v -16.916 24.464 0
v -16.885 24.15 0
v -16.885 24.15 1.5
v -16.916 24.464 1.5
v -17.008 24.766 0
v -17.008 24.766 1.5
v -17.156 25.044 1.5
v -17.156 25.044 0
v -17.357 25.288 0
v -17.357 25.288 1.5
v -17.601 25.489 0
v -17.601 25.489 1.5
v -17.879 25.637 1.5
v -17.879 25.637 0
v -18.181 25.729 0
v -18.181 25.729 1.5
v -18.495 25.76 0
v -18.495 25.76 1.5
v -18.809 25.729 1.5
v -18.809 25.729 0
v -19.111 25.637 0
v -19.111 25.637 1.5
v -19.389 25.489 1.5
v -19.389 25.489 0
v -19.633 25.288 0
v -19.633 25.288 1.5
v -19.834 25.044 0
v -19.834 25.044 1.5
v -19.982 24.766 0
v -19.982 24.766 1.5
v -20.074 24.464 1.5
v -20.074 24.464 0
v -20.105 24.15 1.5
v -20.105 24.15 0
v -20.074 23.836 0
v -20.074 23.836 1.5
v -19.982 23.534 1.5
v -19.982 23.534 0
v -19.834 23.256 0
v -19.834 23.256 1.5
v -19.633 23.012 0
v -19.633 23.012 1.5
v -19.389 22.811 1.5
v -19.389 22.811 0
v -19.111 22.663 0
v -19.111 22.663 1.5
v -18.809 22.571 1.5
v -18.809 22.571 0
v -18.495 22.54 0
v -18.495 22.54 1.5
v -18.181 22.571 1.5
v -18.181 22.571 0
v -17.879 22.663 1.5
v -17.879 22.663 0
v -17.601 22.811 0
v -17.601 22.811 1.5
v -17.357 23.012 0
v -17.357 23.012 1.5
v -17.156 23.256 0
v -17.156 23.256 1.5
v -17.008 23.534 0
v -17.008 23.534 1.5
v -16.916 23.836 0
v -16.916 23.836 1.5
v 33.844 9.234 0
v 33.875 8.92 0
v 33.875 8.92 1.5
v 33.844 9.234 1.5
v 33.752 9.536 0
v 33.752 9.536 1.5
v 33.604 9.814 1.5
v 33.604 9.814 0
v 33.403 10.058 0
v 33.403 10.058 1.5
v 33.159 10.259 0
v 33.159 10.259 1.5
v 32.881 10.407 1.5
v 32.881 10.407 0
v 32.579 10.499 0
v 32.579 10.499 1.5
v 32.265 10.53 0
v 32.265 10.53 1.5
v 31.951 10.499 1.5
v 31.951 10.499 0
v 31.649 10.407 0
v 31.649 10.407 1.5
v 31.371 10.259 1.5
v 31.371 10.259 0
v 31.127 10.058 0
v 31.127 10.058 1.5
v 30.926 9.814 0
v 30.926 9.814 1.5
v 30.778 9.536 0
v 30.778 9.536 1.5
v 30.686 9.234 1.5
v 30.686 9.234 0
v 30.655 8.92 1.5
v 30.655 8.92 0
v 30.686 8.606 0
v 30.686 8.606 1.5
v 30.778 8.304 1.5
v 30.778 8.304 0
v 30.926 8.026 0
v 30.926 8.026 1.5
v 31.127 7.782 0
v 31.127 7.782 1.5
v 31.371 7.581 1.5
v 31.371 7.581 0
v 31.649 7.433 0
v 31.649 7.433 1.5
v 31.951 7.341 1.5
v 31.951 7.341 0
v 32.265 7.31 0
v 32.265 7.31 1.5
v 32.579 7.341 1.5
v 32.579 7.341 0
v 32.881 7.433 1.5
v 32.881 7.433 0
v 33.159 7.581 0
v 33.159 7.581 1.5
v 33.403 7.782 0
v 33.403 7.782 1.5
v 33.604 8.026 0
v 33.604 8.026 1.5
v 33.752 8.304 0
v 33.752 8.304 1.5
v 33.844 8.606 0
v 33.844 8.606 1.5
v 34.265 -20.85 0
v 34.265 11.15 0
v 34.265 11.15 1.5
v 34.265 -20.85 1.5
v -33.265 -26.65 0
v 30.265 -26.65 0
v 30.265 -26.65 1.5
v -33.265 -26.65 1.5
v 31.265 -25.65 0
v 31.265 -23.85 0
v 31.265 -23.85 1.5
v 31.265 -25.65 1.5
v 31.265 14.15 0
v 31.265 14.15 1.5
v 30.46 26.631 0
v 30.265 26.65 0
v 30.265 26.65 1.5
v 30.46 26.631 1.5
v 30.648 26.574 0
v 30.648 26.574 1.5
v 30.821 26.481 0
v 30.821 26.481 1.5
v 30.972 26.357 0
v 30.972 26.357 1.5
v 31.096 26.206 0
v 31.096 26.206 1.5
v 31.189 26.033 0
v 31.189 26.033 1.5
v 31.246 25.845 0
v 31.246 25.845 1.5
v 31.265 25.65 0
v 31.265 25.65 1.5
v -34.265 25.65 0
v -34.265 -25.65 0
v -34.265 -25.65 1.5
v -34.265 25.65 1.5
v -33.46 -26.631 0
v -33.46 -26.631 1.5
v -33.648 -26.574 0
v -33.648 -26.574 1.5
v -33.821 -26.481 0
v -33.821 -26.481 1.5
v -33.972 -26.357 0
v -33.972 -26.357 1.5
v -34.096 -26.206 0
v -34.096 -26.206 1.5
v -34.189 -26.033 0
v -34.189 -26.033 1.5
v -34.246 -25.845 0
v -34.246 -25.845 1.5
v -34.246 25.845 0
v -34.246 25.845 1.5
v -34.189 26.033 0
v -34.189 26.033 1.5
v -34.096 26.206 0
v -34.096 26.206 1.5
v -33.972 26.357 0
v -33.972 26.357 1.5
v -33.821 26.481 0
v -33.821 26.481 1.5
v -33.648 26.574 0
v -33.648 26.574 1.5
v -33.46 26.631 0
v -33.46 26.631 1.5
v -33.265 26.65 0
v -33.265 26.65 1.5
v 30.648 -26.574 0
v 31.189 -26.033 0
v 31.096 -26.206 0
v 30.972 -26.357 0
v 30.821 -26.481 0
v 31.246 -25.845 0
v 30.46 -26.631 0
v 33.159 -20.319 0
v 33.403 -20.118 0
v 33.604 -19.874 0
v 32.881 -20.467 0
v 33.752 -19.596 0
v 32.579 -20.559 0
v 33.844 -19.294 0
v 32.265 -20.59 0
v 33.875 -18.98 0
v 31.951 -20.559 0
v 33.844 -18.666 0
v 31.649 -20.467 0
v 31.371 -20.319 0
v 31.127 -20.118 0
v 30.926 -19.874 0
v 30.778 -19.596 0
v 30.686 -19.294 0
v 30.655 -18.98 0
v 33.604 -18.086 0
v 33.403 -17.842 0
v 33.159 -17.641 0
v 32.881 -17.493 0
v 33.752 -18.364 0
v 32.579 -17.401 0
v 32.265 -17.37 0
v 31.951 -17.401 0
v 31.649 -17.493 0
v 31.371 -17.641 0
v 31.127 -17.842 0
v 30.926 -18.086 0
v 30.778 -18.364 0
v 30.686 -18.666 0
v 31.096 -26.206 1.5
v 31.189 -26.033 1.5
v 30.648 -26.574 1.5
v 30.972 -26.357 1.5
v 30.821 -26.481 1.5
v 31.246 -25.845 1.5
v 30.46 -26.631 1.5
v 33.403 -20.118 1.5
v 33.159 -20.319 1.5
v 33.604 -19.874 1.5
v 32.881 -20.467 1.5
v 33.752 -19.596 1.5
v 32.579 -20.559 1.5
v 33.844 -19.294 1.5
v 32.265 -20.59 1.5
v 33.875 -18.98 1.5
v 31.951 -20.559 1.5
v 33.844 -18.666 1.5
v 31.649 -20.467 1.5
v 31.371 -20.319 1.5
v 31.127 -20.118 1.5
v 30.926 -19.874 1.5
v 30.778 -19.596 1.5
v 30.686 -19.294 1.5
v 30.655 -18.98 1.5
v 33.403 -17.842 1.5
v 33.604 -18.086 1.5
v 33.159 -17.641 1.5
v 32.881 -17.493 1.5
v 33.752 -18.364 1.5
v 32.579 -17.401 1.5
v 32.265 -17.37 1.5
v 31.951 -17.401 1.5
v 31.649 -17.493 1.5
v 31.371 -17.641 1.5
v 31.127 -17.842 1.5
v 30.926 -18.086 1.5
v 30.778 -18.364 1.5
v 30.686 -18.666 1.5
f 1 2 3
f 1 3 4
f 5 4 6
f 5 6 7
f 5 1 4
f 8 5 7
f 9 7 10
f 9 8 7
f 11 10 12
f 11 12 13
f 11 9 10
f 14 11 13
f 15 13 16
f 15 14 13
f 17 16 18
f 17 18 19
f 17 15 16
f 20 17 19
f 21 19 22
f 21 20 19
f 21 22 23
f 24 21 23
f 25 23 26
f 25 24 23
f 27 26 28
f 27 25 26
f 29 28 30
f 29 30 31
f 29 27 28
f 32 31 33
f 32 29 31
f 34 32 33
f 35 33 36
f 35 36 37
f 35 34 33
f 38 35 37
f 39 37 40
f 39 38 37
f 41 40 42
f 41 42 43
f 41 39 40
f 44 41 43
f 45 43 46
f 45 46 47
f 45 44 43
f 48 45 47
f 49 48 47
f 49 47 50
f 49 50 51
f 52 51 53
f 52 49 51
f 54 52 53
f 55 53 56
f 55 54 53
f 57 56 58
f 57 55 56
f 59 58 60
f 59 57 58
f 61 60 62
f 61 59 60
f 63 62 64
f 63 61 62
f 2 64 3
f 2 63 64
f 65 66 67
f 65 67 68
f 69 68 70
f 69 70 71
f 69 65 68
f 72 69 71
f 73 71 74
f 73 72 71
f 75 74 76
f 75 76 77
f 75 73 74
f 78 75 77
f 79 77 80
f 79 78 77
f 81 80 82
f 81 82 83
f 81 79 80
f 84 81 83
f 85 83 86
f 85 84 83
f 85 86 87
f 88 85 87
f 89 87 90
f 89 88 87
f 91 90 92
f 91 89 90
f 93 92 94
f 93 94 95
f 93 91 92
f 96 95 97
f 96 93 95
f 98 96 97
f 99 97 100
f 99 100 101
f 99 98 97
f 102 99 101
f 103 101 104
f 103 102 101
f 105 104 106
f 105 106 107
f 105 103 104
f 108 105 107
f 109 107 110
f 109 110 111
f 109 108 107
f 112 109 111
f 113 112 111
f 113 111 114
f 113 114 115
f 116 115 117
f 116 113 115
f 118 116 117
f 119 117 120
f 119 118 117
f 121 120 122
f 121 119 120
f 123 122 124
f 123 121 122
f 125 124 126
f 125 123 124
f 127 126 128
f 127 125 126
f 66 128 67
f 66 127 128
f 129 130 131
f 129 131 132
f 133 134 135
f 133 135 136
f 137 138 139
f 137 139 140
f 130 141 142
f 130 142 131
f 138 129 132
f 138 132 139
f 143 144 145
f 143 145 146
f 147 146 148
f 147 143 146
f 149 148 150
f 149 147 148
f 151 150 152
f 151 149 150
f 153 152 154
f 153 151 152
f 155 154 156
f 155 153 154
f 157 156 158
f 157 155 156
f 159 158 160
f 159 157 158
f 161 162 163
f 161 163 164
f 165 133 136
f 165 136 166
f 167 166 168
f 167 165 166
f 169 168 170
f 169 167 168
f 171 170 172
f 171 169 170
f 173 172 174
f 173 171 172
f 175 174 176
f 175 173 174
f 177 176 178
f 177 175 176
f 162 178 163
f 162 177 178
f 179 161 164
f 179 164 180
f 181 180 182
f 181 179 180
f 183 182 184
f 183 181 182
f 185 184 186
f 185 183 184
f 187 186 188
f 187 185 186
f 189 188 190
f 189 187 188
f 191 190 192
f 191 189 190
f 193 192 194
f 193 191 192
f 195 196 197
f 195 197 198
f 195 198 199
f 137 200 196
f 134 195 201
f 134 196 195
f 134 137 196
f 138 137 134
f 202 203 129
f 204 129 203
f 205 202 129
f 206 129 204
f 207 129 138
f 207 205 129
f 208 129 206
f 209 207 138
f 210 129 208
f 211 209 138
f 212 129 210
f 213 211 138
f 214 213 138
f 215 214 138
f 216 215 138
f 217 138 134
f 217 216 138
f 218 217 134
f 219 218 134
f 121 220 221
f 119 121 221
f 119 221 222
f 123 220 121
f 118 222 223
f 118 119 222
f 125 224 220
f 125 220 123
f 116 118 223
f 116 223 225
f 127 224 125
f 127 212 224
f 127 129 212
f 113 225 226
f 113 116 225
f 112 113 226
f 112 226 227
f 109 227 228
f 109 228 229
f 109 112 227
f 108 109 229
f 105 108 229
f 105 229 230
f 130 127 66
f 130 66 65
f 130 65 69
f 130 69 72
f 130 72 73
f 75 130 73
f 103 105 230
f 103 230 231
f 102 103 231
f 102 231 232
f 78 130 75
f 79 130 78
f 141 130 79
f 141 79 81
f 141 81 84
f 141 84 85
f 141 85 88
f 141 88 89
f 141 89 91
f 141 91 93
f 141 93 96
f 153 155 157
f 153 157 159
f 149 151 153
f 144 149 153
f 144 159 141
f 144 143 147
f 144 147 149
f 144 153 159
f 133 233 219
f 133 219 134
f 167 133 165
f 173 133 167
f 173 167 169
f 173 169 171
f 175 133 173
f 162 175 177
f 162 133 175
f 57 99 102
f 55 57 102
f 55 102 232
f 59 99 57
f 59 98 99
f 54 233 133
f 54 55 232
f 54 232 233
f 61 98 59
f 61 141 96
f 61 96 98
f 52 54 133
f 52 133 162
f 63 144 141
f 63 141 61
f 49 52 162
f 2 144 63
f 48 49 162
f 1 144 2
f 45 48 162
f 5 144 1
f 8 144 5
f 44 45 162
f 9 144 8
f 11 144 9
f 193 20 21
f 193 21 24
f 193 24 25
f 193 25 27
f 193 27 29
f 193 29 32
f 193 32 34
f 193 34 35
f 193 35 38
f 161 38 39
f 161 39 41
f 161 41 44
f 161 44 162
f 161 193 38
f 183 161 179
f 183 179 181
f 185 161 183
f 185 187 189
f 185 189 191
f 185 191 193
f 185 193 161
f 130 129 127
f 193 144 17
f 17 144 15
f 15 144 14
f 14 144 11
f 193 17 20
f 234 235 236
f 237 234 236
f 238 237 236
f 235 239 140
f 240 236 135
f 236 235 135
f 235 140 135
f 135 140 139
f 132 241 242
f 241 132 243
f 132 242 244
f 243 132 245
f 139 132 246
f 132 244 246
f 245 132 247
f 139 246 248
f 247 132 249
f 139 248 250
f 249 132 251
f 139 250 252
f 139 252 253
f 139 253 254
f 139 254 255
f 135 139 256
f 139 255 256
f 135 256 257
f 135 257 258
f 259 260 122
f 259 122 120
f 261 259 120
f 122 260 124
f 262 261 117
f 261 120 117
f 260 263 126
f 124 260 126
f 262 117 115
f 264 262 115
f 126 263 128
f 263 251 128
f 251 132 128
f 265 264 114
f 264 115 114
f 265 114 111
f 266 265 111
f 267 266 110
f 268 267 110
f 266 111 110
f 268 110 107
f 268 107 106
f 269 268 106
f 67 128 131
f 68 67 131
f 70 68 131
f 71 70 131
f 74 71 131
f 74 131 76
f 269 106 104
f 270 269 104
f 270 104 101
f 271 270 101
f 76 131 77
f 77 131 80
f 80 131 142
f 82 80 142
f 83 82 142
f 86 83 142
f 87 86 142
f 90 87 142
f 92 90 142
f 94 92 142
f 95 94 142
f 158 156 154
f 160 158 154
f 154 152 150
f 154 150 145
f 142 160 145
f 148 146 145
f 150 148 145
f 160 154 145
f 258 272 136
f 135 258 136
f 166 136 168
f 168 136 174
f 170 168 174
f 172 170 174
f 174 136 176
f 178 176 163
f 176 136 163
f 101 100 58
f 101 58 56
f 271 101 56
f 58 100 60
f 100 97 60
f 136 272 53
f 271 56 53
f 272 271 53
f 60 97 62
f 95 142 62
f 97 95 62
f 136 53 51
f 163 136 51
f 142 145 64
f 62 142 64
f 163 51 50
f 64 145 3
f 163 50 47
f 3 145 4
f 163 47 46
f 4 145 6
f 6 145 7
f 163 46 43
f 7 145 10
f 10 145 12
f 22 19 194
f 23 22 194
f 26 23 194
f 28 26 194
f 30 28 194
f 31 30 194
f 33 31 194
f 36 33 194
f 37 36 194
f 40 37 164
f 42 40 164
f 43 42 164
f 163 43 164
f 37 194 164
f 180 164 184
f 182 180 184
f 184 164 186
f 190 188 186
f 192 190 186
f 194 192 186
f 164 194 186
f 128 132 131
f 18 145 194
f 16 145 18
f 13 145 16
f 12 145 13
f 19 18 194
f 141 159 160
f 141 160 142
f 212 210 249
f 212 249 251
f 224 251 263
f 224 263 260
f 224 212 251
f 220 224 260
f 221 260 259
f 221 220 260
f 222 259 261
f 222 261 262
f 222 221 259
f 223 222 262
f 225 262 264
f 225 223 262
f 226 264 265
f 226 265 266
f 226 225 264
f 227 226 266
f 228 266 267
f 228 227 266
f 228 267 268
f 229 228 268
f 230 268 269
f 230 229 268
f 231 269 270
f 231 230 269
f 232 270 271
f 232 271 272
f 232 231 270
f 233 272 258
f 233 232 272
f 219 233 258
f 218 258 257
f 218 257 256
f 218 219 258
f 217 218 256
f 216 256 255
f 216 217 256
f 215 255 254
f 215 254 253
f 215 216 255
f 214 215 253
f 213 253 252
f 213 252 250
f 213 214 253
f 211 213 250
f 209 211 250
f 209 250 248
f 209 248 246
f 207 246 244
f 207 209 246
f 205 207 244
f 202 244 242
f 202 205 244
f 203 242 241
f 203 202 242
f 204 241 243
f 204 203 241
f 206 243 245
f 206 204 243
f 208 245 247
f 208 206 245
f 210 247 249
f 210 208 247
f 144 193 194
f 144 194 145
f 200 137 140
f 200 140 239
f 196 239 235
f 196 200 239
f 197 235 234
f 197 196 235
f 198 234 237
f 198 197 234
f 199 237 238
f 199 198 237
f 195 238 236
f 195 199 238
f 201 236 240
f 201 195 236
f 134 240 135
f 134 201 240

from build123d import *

# Parameters (mm, degrees)
ESQUISSE1_R        = 1.61
BOSS_EXTRU_1_DEPTH = 1.5


with BuildPart() as part:
    # Esquisse1 → Boss.-Extru.1 (new body)
    with BuildSketch(Plane.XY):
        with BuildLine():
            Line((31.265, 25.65), (31.265, 14.15))
            Line((31.265, 14.15), (34.265, 11.15))
            Line((34.265, 11.15), (34.265, -20.85))
            Line((34.265, -20.85), (31.265, -23.85))
            Line((31.265, -23.85), (31.265, -25.65))
            ThreePointArc((31.265, -25.65), (30.972106781, -26.357106781), (30.265, -26.65))
            Line((30.265, -26.65), (-33.265, -26.65))
            ThreePointArc((-33.265, -26.65), (-33.972106781, -26.357106781), (-34.265, -25.65))
            Line((-34.265, -25.65), (-34.265, 25.65))
            ThreePointArc((-34.265, 25.65), (-33.972106781, 26.357106781), (-33.265, 26.65))
            Line((-33.265, 26.65), (30.265, 26.65))
            ThreePointArc((30.265, 26.65), (30.972106781, 26.357106781), (31.265, 25.65))
        make_face()
        with Locations((32.265, 8.92)):
            Circle(ESQUISSE1_R, mode=Mode.SUBTRACT)
        with Locations((32.265, -18.98)):
            Circle(ESQUISSE1_R, mode=Mode.SUBTRACT)
        with Locations((-18.495, 24.15)):
            Circle(ESQUISSE1_R, mode=Mode.SUBTRACT)
    extrude(amount=BOSS_EXTRU_1_DEPTH)


solid = part.part
